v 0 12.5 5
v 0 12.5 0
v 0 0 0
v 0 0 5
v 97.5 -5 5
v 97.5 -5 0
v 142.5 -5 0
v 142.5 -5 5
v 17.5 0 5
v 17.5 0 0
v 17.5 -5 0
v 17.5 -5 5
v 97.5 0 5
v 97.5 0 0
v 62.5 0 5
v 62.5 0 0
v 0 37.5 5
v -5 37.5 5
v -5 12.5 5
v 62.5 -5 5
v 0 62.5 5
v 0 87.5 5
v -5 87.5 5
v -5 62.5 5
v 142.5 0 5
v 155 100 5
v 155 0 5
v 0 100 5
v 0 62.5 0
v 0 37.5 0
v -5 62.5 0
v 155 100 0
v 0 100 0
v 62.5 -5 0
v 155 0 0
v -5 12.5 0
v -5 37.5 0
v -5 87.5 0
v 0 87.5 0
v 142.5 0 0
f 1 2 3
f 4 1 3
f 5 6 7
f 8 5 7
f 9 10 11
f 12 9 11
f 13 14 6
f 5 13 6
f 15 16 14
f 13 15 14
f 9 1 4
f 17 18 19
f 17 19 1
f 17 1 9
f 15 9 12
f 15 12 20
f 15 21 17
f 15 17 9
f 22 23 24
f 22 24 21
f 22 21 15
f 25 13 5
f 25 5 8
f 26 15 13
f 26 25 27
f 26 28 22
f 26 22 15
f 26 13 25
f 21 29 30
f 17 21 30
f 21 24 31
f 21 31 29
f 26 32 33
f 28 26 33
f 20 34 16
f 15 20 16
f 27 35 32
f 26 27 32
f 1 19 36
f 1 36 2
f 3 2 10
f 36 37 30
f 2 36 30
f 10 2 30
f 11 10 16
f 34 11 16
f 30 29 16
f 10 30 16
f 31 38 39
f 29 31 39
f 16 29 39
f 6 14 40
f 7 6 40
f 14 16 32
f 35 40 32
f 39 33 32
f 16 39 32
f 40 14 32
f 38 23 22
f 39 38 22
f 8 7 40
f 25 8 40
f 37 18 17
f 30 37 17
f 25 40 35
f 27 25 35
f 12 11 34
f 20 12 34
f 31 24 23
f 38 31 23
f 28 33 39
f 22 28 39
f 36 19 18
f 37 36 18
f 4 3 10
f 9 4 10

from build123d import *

# Parameters (mm, degrees)
CROQUIS1_W              = 5
CROQUIS1_H              = 25
SALIENTE_EXTRUIR1_DEPTH = 5
CROQUIS3_W              = 5
CROQUIS3_H              = 25
SALIENTE_EXTRUIR2_DEPTH = 5


with BuildPart() as part:
    # Croquis1 → Saliente-Extruir1 (new body)
    with BuildSketch(Plane.XY):
        Polygon((0, 12.5), (0, 0), (17.5, 0), (17.5, -5), (62.5, -5), (62.5, 0), (97.5, 0), (97.5, -5), (142.5, -5), (142.5, 0), (155, 0), (155, 100), (0, 100), (0, 87.5), (5, 87.5), (5, 62.5), (0, 62.5), (0, 37.5), (5, 37.5), (5, 12.5), align=None)
        with Locations((2.5, 25)):
            Rectangle(CROQUIS1_W, CROQUIS1_H)
        with Locations((2.5, 75)):
            Rectangle(CROQUIS1_W, CROQUIS1_H)
    extrude(amount=SALIENTE_EXTRUIR1_DEPTH)

    # Croquis3 → Saliente-Extruir2 (add)
    with BuildSketch(Plane.XY.offset(5)):
        with Locations((-2.5, 25)):
            Rectangle(CROQUIS3_W, CROQUIS3_H)
        with Locations((-2.5, 75)):
            Rectangle(CROQUIS3_W, CROQUIS3_H)
    extrude(amount=-SALIENTE_EXTRUIR2_DEPTH)


solid = part.part
